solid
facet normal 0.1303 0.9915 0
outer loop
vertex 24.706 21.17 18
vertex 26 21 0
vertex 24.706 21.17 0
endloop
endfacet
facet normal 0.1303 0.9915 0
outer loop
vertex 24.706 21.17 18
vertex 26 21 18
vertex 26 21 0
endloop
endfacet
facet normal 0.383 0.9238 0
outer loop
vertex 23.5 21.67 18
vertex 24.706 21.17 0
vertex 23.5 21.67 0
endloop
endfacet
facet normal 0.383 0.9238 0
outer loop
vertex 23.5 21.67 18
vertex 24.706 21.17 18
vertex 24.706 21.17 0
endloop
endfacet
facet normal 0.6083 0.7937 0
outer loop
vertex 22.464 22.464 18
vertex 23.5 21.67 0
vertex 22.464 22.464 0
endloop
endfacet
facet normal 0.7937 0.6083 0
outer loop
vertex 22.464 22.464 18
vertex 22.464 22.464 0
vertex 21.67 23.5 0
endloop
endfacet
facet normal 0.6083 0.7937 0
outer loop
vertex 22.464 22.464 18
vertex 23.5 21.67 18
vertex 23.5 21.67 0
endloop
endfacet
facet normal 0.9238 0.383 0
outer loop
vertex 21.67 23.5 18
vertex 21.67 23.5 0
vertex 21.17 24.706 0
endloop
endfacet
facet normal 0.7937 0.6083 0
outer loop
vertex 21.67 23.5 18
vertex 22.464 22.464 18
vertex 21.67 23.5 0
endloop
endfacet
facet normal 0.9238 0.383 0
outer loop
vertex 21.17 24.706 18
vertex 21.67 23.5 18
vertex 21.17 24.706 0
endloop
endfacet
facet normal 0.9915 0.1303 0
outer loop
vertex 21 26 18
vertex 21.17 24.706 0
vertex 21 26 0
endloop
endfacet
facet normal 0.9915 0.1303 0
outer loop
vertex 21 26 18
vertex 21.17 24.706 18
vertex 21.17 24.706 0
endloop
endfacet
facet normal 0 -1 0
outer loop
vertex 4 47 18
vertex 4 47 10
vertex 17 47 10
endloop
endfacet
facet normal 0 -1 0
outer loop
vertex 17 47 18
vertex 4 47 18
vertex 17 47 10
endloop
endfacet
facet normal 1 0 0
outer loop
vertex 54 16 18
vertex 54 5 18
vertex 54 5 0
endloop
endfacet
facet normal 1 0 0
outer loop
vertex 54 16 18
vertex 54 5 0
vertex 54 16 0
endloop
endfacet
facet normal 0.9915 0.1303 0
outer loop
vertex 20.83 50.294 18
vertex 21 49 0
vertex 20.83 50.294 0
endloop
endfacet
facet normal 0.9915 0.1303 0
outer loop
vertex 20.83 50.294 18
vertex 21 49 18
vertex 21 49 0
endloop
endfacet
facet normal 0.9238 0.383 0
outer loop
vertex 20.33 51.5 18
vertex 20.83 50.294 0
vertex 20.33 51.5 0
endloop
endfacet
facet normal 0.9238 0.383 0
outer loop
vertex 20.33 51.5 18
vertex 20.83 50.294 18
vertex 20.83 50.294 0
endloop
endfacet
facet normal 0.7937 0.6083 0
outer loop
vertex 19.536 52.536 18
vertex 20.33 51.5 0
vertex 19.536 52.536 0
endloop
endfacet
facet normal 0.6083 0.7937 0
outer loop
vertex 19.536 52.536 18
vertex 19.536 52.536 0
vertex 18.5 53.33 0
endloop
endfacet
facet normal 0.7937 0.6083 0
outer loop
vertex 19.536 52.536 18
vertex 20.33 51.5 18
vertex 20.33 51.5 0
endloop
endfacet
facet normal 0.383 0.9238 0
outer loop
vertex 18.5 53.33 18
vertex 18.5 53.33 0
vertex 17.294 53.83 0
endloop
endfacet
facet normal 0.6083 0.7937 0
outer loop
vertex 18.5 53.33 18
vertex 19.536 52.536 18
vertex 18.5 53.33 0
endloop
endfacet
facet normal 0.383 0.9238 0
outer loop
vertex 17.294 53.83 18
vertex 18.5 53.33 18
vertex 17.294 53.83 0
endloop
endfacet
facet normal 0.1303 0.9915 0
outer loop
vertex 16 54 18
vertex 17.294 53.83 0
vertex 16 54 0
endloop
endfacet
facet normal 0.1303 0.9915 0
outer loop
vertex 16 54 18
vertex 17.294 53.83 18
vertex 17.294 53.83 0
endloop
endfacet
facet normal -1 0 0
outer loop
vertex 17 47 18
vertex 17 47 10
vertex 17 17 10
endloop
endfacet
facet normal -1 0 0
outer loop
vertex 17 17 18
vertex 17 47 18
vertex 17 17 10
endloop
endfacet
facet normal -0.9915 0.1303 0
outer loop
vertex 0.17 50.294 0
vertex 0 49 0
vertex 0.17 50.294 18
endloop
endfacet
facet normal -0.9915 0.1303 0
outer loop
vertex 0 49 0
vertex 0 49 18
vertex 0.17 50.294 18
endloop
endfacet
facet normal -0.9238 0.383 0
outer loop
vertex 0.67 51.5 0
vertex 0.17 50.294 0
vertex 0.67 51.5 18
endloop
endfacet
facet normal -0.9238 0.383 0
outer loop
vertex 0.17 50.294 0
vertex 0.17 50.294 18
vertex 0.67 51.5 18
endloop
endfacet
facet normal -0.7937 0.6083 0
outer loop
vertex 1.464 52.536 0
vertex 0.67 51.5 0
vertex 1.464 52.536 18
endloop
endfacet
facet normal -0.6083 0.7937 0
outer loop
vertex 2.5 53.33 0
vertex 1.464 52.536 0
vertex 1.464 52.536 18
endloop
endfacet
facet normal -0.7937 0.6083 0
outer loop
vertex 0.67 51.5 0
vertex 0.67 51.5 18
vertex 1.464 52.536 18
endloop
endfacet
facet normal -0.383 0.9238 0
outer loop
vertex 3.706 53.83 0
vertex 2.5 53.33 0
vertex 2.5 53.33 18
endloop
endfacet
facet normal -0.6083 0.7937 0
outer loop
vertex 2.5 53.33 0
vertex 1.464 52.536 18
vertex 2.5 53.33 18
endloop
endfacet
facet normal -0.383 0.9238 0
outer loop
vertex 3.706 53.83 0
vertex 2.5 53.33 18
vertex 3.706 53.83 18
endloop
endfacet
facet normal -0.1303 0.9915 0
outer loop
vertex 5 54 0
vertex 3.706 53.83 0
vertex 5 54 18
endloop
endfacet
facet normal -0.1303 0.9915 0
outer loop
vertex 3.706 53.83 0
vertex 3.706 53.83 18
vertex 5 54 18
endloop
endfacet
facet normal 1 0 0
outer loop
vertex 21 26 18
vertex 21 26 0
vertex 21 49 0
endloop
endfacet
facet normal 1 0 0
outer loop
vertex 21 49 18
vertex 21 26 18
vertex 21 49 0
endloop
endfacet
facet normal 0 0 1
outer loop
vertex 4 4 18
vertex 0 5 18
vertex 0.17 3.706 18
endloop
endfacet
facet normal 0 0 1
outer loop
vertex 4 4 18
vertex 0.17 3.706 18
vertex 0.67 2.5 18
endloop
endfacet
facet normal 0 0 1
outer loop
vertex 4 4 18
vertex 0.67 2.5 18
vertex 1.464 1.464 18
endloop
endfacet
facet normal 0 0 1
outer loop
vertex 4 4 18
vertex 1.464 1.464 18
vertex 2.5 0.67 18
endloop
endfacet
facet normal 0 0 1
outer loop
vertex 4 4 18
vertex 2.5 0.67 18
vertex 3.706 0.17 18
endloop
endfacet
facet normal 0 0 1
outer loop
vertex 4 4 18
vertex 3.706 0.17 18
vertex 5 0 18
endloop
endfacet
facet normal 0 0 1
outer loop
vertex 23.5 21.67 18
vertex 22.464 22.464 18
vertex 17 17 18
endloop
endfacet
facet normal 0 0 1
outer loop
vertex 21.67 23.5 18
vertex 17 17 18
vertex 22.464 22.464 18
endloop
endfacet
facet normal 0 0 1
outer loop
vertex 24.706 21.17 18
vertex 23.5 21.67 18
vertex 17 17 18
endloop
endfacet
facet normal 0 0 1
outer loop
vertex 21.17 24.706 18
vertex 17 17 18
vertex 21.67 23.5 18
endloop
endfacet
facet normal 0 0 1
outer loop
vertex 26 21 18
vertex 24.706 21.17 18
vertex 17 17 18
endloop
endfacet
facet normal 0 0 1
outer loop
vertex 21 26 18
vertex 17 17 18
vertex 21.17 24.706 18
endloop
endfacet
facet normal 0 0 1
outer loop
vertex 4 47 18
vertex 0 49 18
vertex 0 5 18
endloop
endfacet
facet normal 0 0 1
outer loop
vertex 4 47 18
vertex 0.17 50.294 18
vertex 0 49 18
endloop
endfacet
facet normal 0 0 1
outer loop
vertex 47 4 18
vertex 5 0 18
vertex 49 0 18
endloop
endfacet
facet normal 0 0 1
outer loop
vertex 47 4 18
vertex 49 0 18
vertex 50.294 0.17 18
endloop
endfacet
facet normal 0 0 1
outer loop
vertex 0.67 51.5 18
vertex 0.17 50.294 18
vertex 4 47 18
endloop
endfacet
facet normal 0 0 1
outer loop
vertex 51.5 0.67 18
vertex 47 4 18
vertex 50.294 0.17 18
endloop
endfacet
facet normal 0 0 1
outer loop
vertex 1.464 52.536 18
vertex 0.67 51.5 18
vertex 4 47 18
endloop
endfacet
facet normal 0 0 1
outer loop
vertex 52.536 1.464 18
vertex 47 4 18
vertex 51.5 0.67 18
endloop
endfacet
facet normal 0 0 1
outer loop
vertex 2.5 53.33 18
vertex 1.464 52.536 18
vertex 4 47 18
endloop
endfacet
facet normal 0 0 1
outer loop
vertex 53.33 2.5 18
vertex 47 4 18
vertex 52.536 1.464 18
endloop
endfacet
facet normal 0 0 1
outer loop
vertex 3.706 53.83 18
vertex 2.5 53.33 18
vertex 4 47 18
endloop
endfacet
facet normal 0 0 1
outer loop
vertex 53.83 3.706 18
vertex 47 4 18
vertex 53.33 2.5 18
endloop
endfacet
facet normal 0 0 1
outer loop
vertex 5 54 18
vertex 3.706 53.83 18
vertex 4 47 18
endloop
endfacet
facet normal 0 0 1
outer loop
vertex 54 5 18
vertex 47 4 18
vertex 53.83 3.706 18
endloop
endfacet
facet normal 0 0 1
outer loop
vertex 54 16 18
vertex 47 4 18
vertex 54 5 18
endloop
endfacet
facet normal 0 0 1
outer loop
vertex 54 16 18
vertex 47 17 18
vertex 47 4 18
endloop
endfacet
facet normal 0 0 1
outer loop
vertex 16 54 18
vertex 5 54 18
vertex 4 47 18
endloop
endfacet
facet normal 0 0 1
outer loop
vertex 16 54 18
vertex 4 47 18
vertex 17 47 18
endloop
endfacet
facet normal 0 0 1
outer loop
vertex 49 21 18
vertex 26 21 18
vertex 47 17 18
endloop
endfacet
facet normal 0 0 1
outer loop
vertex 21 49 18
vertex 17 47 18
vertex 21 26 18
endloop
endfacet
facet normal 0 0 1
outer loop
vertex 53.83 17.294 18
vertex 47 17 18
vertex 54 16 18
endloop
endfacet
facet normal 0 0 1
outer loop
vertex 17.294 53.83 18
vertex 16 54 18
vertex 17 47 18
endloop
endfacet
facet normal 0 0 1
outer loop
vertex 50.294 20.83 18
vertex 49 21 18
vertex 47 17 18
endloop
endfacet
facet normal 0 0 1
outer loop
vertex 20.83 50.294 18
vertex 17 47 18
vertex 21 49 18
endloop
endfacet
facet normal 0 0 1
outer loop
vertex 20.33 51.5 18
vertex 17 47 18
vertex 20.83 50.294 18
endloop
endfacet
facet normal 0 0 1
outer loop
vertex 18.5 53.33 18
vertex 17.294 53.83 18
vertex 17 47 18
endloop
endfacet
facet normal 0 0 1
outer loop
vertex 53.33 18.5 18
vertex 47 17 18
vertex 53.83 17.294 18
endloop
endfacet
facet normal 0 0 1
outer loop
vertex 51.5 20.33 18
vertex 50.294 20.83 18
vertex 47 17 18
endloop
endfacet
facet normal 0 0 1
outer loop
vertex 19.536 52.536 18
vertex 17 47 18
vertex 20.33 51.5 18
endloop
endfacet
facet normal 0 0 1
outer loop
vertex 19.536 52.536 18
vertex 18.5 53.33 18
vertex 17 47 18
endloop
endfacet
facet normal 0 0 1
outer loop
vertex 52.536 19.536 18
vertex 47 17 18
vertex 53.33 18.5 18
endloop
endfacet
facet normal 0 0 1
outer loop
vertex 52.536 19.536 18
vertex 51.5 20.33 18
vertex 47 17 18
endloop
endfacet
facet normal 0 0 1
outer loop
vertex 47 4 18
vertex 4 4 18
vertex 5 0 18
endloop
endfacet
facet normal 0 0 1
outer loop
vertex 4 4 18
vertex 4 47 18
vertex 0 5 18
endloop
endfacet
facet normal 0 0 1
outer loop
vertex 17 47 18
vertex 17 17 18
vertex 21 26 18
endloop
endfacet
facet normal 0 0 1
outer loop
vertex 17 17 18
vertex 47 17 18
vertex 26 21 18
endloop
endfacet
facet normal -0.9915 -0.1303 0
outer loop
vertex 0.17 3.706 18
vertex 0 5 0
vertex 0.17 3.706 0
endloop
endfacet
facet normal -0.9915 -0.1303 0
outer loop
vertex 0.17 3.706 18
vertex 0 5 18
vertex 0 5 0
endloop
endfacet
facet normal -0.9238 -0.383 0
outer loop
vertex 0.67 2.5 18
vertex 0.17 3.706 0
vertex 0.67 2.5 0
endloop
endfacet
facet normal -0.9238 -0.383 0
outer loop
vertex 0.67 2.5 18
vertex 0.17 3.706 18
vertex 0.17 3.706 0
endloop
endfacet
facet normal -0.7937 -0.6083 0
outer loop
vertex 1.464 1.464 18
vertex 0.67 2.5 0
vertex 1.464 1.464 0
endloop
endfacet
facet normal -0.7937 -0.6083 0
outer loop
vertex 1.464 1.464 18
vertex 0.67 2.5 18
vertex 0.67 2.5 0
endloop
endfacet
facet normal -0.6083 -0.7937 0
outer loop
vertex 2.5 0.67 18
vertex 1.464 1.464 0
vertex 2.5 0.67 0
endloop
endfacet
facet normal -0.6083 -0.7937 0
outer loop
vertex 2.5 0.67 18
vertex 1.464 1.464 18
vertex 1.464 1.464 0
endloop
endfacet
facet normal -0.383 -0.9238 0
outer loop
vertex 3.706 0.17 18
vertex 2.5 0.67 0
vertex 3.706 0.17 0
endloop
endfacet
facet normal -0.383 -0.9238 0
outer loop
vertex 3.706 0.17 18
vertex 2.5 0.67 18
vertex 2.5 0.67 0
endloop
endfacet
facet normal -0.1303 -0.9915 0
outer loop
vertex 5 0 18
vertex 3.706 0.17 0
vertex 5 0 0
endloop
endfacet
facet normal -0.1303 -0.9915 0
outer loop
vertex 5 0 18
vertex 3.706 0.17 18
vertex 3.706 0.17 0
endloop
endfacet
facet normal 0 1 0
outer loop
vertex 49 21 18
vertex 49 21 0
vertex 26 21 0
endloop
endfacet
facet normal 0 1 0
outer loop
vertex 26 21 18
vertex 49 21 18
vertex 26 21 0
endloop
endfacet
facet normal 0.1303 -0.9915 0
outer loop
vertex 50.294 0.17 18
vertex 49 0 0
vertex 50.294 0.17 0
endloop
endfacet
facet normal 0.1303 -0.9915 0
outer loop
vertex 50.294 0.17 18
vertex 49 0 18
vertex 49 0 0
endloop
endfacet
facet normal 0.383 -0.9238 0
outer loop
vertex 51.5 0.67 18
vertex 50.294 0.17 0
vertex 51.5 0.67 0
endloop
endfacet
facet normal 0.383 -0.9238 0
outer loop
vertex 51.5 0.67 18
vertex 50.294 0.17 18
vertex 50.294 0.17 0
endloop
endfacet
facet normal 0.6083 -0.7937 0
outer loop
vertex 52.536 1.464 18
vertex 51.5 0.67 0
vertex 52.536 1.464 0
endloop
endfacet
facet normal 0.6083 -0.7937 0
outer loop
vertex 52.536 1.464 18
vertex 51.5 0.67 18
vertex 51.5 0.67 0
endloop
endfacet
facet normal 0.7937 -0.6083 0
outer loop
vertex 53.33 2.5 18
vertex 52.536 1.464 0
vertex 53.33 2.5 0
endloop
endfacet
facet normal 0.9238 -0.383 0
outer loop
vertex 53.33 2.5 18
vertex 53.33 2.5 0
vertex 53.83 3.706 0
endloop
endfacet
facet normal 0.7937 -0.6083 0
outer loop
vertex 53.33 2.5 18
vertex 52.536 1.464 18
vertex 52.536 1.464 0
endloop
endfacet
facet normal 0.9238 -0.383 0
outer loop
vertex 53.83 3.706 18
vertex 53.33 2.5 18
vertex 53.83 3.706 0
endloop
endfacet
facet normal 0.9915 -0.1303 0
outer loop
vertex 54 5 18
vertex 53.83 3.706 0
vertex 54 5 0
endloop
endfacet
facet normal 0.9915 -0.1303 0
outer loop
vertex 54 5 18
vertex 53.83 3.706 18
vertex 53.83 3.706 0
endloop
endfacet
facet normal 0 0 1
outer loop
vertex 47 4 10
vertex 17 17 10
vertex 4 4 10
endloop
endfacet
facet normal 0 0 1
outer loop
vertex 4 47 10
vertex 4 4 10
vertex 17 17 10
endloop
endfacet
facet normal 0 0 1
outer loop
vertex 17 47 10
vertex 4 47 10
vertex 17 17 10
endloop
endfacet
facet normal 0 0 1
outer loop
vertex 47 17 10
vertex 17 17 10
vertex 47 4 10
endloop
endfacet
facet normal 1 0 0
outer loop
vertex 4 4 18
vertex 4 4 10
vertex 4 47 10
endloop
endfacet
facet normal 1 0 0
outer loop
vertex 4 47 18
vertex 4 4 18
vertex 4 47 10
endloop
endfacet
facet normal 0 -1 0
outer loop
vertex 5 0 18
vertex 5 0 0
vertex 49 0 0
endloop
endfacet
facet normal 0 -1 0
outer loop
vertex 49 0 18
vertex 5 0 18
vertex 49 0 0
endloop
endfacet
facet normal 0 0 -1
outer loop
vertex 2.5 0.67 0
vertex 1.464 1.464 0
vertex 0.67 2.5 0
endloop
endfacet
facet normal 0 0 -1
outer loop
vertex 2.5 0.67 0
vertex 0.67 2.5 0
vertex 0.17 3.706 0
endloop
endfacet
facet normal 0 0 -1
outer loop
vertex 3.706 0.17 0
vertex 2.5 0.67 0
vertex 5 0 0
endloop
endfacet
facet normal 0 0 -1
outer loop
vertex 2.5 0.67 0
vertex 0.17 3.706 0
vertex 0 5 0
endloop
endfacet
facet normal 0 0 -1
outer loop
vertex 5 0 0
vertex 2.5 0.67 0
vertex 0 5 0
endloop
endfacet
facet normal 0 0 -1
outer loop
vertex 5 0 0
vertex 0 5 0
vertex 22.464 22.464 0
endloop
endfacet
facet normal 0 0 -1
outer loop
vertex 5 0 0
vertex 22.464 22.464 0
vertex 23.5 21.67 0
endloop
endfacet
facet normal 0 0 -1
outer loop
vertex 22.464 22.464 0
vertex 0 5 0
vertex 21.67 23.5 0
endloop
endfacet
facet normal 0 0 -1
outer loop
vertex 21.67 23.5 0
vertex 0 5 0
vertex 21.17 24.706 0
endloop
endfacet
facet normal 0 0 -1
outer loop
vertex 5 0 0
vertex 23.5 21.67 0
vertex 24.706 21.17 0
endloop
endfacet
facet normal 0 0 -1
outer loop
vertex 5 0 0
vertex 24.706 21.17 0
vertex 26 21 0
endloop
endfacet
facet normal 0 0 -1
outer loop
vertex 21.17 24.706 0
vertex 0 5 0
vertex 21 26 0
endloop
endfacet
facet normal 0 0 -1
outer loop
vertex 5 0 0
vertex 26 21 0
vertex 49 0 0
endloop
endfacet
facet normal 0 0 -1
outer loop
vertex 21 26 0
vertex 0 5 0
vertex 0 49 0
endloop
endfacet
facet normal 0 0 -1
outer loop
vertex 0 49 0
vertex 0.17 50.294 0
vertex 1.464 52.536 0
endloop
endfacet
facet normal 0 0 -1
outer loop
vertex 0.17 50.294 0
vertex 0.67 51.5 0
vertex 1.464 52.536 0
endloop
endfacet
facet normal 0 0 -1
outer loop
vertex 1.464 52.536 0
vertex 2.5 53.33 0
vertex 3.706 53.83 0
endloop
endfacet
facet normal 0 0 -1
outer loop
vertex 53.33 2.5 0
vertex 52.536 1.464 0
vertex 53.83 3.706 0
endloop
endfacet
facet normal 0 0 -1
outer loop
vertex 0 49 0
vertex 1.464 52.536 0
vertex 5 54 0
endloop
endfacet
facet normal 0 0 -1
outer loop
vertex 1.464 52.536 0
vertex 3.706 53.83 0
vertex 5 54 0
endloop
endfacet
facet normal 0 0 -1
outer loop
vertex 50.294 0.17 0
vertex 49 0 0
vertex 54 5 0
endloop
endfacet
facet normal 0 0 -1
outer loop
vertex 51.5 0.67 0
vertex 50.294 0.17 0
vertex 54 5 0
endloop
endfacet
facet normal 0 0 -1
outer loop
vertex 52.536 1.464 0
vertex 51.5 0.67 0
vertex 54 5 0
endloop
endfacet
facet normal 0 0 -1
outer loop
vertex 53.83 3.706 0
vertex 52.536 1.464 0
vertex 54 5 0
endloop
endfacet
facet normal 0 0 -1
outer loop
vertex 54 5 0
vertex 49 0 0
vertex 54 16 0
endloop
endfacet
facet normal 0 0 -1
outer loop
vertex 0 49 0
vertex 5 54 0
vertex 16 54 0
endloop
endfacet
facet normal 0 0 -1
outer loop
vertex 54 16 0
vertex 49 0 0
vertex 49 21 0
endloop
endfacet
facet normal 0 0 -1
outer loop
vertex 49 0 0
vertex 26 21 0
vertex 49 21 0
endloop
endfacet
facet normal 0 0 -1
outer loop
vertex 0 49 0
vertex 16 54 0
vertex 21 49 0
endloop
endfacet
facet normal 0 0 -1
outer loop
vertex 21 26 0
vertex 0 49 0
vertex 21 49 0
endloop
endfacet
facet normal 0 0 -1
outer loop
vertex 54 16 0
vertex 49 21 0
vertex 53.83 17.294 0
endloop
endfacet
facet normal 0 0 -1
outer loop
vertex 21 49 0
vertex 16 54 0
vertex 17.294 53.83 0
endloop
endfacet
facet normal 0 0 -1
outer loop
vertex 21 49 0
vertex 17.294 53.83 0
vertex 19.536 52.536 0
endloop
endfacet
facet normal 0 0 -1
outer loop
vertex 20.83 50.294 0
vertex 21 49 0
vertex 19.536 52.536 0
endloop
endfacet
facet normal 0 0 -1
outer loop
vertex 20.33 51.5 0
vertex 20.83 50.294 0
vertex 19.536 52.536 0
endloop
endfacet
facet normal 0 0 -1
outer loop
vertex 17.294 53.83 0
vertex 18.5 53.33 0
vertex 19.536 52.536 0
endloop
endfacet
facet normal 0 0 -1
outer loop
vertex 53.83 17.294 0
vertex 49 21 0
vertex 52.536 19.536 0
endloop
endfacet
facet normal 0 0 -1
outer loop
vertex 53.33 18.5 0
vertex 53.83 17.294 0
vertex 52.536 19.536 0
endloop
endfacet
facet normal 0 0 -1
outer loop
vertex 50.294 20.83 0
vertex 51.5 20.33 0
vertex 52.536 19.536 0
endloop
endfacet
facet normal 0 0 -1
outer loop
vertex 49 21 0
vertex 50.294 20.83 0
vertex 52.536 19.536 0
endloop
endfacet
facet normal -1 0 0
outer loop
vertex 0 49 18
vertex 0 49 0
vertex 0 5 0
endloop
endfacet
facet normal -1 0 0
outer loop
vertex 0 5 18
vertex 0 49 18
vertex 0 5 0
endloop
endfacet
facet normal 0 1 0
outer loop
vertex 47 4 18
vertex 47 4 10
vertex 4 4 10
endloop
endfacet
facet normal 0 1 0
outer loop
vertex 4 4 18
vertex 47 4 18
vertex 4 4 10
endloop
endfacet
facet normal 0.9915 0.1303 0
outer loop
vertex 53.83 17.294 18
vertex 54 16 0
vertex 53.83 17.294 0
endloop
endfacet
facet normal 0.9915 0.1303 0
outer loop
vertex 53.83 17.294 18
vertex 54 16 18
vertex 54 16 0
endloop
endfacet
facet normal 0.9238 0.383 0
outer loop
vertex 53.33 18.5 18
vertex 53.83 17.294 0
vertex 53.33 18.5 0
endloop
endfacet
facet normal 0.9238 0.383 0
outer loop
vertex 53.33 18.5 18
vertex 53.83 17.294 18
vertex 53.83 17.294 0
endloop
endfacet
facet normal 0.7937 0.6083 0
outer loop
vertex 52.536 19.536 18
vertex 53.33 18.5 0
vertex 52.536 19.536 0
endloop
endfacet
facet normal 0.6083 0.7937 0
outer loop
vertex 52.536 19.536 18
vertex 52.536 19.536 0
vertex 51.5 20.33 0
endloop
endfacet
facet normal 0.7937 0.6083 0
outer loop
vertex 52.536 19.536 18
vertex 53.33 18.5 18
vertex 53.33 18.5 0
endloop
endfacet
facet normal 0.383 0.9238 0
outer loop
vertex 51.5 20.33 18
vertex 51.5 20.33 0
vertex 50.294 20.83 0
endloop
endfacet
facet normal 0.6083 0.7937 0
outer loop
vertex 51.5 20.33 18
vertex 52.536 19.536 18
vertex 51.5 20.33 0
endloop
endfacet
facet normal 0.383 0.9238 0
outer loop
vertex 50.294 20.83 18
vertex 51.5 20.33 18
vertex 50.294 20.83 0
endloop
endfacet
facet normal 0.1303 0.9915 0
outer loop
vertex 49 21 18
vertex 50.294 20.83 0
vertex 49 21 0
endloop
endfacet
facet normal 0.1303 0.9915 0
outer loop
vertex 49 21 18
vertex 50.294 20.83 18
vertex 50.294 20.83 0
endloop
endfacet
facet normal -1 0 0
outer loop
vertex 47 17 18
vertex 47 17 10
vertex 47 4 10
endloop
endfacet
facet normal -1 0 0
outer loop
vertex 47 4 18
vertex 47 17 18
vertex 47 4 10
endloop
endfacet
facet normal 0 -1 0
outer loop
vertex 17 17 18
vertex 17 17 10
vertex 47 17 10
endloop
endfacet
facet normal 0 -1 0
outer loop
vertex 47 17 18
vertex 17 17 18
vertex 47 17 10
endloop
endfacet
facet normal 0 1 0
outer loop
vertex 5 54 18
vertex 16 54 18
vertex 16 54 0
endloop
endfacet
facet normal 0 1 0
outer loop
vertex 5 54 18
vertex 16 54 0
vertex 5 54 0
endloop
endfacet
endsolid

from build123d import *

# Parameters (mm, degrees)
F1_DEPTH = 18
F2_DEPTH = 10
F3_R     = 5


with BuildPart() as f1:
    # F0 (on Top) → F1 (new body)
    with BuildSketch(Plane.XY):
        Polygon((0, 54), (0, 0), (54, 0), (54, 4), (47, 4), (4, 4), (4, 47), (4, 54), align=None)
        Polygon((47, 4), (54, 4), (54, 21), (21, 21), (21, 54), (4, 54), (4, 47), (17, 47), (17, 17), (47, 17), align=None)
    extrude(amount=F1_DEPTH)

    # F0 (on Top) → F2 (join)
    with BuildSketch(Plane.XY):
        Polygon((4, 4), (47, 4), (47, 17), (17, 17), (17, 47), (4, 47), align=None)
    extrude(amount=F2_DEPTH)

    # F3
    f3_edges = [f1.edges().sort_by_distance(p)[0] for p in [
        (0, 0, 9),
        (0, 54, 9),
        (54, 0, 9),
        (54, 21, 9),
        (21, 54, 9),
        (21, 21, 9),
    ]]
    fillet(f3_edges, radius=F3_R)


solid = f1.part
